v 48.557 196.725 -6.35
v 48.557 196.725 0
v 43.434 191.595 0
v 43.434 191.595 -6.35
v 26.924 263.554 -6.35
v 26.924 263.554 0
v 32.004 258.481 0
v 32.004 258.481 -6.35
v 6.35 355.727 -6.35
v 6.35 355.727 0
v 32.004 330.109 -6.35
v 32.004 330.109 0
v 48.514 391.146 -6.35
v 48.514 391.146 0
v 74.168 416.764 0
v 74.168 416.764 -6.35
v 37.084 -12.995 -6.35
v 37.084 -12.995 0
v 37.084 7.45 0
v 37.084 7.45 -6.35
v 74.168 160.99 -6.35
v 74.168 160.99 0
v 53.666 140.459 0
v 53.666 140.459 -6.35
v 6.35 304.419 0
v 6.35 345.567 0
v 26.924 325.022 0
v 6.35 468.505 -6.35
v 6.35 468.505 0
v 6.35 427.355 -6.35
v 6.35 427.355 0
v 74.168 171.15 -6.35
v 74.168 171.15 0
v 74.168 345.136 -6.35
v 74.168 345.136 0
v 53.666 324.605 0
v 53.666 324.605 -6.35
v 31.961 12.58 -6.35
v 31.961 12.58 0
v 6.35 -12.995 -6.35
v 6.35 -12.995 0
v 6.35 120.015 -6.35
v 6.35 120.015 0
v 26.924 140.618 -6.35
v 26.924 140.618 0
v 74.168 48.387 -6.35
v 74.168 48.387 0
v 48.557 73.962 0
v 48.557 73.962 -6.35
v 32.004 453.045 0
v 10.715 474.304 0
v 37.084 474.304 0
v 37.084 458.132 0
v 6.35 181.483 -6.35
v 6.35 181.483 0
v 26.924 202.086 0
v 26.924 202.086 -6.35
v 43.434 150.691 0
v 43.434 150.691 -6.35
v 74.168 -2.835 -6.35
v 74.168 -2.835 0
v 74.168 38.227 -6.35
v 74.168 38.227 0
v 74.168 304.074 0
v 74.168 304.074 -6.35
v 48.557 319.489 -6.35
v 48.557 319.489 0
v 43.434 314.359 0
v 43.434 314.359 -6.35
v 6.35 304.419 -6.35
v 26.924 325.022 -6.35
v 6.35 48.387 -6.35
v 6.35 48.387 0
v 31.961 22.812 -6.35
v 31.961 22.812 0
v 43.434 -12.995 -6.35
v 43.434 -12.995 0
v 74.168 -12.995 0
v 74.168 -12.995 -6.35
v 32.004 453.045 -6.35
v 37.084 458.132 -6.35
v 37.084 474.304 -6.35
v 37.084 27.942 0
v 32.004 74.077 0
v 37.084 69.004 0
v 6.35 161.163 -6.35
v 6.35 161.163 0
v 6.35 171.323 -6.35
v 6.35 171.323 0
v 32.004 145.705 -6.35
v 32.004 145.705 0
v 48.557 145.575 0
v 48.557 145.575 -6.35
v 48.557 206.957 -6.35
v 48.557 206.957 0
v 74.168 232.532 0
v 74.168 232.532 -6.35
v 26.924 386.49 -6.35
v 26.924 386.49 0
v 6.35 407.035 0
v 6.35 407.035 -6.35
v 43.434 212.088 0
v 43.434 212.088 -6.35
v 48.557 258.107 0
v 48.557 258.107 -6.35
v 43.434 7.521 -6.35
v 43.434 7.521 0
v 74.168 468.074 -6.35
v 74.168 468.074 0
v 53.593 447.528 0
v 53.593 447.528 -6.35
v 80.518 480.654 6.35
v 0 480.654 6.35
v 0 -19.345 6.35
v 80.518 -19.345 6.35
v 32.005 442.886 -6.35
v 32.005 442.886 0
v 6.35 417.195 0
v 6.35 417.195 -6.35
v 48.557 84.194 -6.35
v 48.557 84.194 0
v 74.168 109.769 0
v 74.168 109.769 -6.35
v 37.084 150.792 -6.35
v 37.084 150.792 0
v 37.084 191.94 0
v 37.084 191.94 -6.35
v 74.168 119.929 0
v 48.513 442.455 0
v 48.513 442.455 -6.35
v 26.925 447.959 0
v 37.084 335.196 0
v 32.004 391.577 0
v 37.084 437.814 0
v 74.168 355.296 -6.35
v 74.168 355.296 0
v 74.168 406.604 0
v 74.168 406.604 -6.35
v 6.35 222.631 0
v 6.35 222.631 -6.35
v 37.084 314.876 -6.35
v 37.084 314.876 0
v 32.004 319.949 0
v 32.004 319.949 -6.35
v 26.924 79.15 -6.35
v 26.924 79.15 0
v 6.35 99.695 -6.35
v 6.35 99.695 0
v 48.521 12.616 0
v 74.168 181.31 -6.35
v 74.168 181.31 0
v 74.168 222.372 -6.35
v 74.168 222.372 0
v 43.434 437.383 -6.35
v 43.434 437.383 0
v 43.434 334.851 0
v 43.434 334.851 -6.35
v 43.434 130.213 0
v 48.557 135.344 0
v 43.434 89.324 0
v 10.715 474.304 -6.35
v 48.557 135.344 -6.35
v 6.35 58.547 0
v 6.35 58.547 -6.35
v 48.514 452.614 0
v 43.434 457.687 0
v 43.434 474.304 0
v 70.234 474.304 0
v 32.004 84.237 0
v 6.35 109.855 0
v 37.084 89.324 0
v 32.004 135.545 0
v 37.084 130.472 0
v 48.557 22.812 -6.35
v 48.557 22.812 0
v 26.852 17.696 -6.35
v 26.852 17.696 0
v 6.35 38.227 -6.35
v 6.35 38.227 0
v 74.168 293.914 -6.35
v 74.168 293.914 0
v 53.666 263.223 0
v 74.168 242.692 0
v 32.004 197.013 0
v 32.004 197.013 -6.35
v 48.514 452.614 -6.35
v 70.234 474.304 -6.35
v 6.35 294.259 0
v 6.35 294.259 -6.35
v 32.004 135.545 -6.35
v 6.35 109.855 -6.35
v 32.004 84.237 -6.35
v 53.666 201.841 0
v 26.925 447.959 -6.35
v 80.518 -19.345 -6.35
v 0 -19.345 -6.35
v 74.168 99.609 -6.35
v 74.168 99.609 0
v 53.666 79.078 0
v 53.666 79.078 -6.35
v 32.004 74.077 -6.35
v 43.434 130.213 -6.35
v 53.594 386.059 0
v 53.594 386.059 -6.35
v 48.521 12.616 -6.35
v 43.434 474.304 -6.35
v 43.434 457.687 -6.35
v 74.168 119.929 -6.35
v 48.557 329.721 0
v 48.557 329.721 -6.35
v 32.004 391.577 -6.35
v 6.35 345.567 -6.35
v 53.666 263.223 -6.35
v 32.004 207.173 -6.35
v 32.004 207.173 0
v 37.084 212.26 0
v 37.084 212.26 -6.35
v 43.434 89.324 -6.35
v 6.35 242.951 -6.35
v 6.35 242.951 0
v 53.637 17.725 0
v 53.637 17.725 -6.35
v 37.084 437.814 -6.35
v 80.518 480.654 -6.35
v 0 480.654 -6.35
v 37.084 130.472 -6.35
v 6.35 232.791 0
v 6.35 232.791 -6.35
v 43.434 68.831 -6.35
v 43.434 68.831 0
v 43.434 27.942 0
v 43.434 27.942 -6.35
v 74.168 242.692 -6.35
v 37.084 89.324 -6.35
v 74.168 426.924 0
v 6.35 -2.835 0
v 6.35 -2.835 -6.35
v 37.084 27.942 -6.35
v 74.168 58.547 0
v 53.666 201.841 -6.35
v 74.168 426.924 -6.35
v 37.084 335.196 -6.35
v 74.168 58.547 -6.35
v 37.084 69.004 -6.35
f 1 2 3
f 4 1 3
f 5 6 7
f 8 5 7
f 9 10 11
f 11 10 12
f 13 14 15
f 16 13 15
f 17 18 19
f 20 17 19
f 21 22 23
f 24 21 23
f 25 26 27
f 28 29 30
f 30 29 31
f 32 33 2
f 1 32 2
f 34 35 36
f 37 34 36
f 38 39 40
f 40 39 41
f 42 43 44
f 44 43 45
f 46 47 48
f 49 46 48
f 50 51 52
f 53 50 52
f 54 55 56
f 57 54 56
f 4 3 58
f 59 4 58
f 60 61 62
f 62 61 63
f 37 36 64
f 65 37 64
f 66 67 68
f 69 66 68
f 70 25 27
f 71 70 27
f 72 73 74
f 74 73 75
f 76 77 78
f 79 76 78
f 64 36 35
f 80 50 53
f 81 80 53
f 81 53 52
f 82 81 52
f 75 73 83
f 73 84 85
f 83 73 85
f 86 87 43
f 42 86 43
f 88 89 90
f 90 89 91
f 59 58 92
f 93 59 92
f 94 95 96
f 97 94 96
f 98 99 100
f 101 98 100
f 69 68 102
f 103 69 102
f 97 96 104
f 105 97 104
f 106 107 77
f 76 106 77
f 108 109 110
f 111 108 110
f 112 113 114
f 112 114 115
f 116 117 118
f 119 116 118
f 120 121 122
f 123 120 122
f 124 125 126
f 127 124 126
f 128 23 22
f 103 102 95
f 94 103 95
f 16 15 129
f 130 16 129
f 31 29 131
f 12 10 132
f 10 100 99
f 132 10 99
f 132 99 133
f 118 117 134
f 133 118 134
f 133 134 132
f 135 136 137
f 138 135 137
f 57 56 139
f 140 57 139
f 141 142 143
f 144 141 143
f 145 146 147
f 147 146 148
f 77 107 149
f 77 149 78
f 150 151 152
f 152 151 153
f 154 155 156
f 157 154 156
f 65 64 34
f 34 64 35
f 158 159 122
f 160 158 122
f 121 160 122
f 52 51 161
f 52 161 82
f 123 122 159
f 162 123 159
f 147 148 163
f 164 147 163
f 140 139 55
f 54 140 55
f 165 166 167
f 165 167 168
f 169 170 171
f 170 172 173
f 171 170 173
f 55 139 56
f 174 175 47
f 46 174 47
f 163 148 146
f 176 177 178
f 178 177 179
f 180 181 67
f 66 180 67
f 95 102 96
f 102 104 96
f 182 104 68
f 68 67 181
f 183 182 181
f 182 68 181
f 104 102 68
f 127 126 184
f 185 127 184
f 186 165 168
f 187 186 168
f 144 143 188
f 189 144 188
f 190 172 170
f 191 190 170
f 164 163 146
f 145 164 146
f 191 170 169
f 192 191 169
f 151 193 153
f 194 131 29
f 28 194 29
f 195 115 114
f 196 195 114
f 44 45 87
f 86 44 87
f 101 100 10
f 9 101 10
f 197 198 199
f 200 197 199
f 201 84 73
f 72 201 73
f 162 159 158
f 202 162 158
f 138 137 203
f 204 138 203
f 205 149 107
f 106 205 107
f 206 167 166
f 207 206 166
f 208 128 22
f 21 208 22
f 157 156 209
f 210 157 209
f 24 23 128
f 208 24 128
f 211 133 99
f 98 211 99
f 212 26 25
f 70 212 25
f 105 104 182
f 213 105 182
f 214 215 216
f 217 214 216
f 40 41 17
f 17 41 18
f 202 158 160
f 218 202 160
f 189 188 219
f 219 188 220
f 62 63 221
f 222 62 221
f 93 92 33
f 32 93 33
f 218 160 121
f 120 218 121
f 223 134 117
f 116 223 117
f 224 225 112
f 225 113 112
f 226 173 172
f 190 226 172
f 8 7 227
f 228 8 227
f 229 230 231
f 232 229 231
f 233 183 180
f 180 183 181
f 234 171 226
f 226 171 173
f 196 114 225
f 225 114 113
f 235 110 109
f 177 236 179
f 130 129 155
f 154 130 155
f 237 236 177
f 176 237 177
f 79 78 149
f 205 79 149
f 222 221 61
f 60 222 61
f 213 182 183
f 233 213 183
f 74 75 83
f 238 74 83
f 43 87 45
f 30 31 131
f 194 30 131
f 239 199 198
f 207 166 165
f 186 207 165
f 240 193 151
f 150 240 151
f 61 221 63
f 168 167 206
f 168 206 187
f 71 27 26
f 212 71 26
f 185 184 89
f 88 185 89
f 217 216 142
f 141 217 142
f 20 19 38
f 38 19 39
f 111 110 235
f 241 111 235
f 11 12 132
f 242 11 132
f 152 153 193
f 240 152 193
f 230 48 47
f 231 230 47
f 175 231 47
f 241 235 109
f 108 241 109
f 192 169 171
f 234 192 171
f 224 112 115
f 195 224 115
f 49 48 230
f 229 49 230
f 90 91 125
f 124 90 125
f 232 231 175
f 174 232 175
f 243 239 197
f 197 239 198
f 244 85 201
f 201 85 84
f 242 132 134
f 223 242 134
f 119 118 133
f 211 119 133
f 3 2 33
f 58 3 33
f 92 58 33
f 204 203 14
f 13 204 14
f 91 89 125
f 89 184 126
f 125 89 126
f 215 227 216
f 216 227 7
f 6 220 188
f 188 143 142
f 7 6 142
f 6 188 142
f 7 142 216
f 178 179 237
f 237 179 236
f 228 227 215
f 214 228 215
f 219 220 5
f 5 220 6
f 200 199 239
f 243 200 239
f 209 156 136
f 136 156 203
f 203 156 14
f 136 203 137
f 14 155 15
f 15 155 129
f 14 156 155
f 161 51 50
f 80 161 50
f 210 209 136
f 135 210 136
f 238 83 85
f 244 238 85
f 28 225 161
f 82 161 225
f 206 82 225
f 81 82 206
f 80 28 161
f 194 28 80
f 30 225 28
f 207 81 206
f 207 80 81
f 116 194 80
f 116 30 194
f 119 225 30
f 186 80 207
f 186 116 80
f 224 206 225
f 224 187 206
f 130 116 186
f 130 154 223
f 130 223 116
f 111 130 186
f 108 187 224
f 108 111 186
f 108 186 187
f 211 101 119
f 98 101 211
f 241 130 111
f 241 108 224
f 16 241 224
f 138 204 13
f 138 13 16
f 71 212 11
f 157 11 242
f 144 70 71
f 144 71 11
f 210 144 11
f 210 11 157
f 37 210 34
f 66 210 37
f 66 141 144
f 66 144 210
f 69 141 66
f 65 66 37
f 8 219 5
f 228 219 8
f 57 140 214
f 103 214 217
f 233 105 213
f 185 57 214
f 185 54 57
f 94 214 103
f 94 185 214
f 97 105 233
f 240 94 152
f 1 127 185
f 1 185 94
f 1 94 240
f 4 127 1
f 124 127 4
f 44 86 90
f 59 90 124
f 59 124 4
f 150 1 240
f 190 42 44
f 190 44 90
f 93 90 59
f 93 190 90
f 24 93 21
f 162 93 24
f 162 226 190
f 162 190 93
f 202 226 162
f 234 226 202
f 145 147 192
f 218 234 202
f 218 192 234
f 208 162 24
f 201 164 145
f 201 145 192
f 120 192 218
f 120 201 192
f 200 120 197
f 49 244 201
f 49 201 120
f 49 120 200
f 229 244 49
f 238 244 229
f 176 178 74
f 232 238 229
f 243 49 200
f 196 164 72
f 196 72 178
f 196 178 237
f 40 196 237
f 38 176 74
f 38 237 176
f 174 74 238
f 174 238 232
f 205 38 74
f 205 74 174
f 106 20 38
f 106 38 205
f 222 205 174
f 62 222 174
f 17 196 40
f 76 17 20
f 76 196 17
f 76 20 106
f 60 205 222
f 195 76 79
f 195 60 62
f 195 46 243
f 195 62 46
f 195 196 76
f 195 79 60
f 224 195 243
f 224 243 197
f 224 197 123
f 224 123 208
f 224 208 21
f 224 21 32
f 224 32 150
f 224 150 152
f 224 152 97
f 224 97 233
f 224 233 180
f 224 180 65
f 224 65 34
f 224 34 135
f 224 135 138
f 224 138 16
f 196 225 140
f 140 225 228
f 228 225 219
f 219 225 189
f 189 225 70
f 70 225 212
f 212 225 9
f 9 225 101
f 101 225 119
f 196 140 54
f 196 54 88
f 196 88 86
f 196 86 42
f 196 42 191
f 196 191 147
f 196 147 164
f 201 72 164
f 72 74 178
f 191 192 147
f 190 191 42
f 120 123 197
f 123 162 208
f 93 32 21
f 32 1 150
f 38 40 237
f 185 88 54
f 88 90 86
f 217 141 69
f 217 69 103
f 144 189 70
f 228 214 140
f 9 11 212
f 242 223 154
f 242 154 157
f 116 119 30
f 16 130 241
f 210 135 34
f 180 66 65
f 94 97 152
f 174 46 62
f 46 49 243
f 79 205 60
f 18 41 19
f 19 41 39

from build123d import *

# Parameters (mm, degrees)
F0_W     = 80.518
F0_H     = 499.999
F1_DEPTH = 6.35
F2_W     = 67.818
F2_H     = 6.35
F3_DEPTH = 6.35
F5_DEPTH = 6.35
F6_DEPTH = 6.35
F7_DEPTH = 6.35


# Not quite as in the source:
# - a feature names something its author has since deleted; it is built from what else it names


with BuildPart() as f1:
    # F0 (on Top) → F1 (new body)
    with BuildSketch(Plane.XY):
        with Locations((40.259, 230.6542872722)):
            Rectangle(F0_W, F0_H)
    extrude(amount=F1_DEPTH)

    # F2 (on face) → F3 (join)
    with BuildSketch(Plane(origin=(0, 0, 0), x_dir=(1, 0, 0), z_dir=(0, 0, -1))):
        Polygon((80.518, 19.3452127278), (74.168, 19.3452127278), (74.168, 12.9952127278), (74.168, -474.3037872722), (74.168, -480.6537872722), (80.518, -480.6537872722), align=None)
        Polygon((6.35, 19.3452127278), (0, 19.3452127278), (0, -480.6537872722), (6.35, -480.6537872722), (6.35, -474.3037872722), (6.35, 12.9952127278), align=None)
        with Locations((40.259, 16.1702127278)):
            Rectangle(F2_W, F2_H)
        with Locations((40.259, -477.4787872722)):
            Rectangle(F2_W, F2_H)
    extrude(amount=F3_DEPTH)

    # F4 (on face) → F5 (join)
    with BuildSketch(Plane(origin=(0, 0, 0), x_dir=(1, 0, 0), z_dir=(0, 0, -1))):
        Polygon((43.434, 12.9952127278), (37.084, 12.9952127278), (37.084, -7.4495371679), (37.084, -27.9419109224), (37.084, -69.0037844682), (37.084, -89.3237844682), (37.084, -130.4718448913), (37.084, -150.7918448913), (37.084, -191.9399053144), (37.084, -212.2599053144), (37.084, -253.4079657375), (37.084, -263.5679657375), (37.084, -273.7279657375), (37.084, -314.8760261606), (37.084, -335.1960261606), (37.084, -376.3440865837), (37.084, -386.5040865837), (37.084, -396.6640865837), (37.084, -437.8136164283), (37.084, -458.1321470068), (37.084, -474.3037872722), (43.434, -474.3037872722), (43.434, -457.6869668698), (43.434, -437.3826820421), (43.434, -396.2331521975), (43.434, -386.0731521975), (43.434, -375.9131521975), (43.434, -334.8512786517), (43.434, -314.3589048972), (43.434, -273.4694051058), (43.434, -263.2232182286), (43.434, -252.9770313513), (43.434, -212.08753156), (43.434, -191.5951578055), (43.434, -150.6912914171), (43.434, -130.2132842596), (43.434, -89.3237844682), (43.434, -68.8314107138), (43.434, -27.9419109224), (43.434, -7.5214582917), align=None)
        Polygon((48.5570884026, -319.4891816343), (43.434, -314.3589048972), (43.434, -334.8512786517), (48.5570884026, -329.7210019146), (74.168, -355.2960285474), (74.168, -345.1360285474), (53.6658303382, -324.6050917744), (74.168, -304.0741550015), (74.168, -293.9141550015), align=None)
        Polygon((48.5132602963, -442.4548254861), (43.434, -437.3826820421), (43.434, -457.6869668698), (48.5139950064, -452.6140897452), (70.2341258947, -474.3037872722), (74.168, -474.3037872722), (74.168, -468.0736188151), (53.5932553027, -447.5277026107), (74.168, -426.9240889705), (74.168, -416.7640889705), align=None)
        Polygon((37.084, -458.1321470068), (37.084, -437.8136164283), (32.0047397037, -442.8857598723), (6.35, -417.1950233567), (6.35, -427.3550233567), (26.9247446973, -447.9586369969), (6.35, -468.5045532013), (6.35, -474.3037872722), (10.7154131464, -474.3037872722), (32.0040049936, -453.0450241314), align=None)
        Polygon((6.35, -417.1950233567), (32.0040049936, -391.5769637083), (26.9240099873, -386.4898408329), (6.35, -407.0350233567), align=None)
        Polygon((53.5939900127, -386.0589064467), (48.5139950064, -391.1460293221), (74.168, -416.7640889705), (74.168, -406.6040889705), align=None)
        Polygon((48.5570884026, -196.7254345426), (43.434, -191.5951578055), (43.434, -212.08753156), (48.5570884026, -206.9572548229), (74.168, -232.5322814557), (74.168, -222.3722814557), (53.6658303382, -201.8413446827), (74.168, -181.3104079098), (74.168, -171.1504079098), align=None)
        Polygon((74.168, -232.5322814557), (48.5570884026, -258.1073080885), (53.6658303382, -263.2232182286), (74.168, -242.6922814557), align=None)
        Polygon((37.084, -335.1960261606), (37.084, -314.8760261606), (32.0040049936, -319.9489032852), (6.35, -294.2589025105), (6.35, -304.4189025105), (26.9240099873, -325.0217804098), (6.35, -345.5669629336), (6.35, -355.7269629336), (32.0040049936, -330.1089032852), align=None)
        Polygon((26.9240099873, -263.5537199867), (32.0040049936, -258.4808428621), (6.35, -232.7908420874), (6.35, -242.9508420874), align=None)
    extrude(amount=F5_DEPTH)

    # F4 (on face) → F6 (join)
    with BuildSketch(Plane(origin=(0, 0, 0), x_dir=(1, 0, 0), z_dir=(0, 0, -1))):
        Polygon((37.084, -150.7918448913), (37.084, -130.4718448913), (32.0040049936, -135.5447220159), (6.35, -109.8547212412), (6.35, -120.0147212412), (26.9240099873, -140.6175991405), (6.35, -161.1627816643), (6.35, -171.3227816643), (32.0040049936, -145.7047220159), align=None)
        Polygon((48.5570884026, -135.3435609967), (43.434, -130.2132842596), (43.434, -150.6912914171), (48.5570884026, -145.575381277), (74.168, -171.1504079098), (74.168, -160.9904079098), (53.6658303382, -140.4594711369), (74.168, -119.9285343639), (74.168, -109.7685343639), align=None)
        Polygon((31.9609115974, -12.579813905), (6.35, 12.9952127278), (6.35, 2.8352127278), (26.8521696618, -17.6957240451), (6.35, -38.2266608181), (6.35, -48.3866608181), (31.9609115974, -22.8116341853), (37.084, -27.9419109224), (37.084, -7.4495371679), align=None)
        Polygon((74.168, 2.8352127278), (74.168, 12.9952127278), (48.5211278761, -12.6157240451), (43.434, -7.5214582917), (43.434, -27.9419109224), (48.5570884026, -22.8116341853), (74.168, -48.3866608181), (74.168, -38.2266608181), (53.637083409, -17.7245113099), align=None)
        Polygon((48.5570884026, -73.9616874509), (43.434, -68.8314107138), (43.434, -89.3237844682), (48.5570884026, -84.1935077311), (74.168, -109.7685343639), (74.168, -99.6085343639), (53.6658303382, -79.077597591), (74.168, -58.5466608181), (74.168, -48.3866608181), align=None)
    extrude(amount=F6_DEPTH)

    # F4 (on face) → F7 (join)
    with BuildSketch(Plane(origin=(0, 0, 0), x_dir=(1, 0, 0), z_dir=(0, 0, -1))):
        Polygon((32.0040049936, -74.0766615928), (6.35, -48.3866608181), (6.35, -58.5466608181), (26.9240099873, -79.1495387174), (6.35, -99.6947212412), (6.35, -109.8547212412), (32.0040049936, -84.2366615928), (37.084, -89.3237844682), (37.084, -69.0037844682), align=None)
        Polygon((37.084, -212.2599053144), (37.084, -191.9399053144), (32.0040049936, -197.012782439), (6.35, -171.3227816643), (6.35, -181.4827816643), (26.9240099873, -202.0856595636), (6.35, -222.6308420874), (6.35, -232.7908420874), (32.0040049936, -207.172782439), align=None)
    extrude(amount=F7_DEPTH)


solid = f1.part
